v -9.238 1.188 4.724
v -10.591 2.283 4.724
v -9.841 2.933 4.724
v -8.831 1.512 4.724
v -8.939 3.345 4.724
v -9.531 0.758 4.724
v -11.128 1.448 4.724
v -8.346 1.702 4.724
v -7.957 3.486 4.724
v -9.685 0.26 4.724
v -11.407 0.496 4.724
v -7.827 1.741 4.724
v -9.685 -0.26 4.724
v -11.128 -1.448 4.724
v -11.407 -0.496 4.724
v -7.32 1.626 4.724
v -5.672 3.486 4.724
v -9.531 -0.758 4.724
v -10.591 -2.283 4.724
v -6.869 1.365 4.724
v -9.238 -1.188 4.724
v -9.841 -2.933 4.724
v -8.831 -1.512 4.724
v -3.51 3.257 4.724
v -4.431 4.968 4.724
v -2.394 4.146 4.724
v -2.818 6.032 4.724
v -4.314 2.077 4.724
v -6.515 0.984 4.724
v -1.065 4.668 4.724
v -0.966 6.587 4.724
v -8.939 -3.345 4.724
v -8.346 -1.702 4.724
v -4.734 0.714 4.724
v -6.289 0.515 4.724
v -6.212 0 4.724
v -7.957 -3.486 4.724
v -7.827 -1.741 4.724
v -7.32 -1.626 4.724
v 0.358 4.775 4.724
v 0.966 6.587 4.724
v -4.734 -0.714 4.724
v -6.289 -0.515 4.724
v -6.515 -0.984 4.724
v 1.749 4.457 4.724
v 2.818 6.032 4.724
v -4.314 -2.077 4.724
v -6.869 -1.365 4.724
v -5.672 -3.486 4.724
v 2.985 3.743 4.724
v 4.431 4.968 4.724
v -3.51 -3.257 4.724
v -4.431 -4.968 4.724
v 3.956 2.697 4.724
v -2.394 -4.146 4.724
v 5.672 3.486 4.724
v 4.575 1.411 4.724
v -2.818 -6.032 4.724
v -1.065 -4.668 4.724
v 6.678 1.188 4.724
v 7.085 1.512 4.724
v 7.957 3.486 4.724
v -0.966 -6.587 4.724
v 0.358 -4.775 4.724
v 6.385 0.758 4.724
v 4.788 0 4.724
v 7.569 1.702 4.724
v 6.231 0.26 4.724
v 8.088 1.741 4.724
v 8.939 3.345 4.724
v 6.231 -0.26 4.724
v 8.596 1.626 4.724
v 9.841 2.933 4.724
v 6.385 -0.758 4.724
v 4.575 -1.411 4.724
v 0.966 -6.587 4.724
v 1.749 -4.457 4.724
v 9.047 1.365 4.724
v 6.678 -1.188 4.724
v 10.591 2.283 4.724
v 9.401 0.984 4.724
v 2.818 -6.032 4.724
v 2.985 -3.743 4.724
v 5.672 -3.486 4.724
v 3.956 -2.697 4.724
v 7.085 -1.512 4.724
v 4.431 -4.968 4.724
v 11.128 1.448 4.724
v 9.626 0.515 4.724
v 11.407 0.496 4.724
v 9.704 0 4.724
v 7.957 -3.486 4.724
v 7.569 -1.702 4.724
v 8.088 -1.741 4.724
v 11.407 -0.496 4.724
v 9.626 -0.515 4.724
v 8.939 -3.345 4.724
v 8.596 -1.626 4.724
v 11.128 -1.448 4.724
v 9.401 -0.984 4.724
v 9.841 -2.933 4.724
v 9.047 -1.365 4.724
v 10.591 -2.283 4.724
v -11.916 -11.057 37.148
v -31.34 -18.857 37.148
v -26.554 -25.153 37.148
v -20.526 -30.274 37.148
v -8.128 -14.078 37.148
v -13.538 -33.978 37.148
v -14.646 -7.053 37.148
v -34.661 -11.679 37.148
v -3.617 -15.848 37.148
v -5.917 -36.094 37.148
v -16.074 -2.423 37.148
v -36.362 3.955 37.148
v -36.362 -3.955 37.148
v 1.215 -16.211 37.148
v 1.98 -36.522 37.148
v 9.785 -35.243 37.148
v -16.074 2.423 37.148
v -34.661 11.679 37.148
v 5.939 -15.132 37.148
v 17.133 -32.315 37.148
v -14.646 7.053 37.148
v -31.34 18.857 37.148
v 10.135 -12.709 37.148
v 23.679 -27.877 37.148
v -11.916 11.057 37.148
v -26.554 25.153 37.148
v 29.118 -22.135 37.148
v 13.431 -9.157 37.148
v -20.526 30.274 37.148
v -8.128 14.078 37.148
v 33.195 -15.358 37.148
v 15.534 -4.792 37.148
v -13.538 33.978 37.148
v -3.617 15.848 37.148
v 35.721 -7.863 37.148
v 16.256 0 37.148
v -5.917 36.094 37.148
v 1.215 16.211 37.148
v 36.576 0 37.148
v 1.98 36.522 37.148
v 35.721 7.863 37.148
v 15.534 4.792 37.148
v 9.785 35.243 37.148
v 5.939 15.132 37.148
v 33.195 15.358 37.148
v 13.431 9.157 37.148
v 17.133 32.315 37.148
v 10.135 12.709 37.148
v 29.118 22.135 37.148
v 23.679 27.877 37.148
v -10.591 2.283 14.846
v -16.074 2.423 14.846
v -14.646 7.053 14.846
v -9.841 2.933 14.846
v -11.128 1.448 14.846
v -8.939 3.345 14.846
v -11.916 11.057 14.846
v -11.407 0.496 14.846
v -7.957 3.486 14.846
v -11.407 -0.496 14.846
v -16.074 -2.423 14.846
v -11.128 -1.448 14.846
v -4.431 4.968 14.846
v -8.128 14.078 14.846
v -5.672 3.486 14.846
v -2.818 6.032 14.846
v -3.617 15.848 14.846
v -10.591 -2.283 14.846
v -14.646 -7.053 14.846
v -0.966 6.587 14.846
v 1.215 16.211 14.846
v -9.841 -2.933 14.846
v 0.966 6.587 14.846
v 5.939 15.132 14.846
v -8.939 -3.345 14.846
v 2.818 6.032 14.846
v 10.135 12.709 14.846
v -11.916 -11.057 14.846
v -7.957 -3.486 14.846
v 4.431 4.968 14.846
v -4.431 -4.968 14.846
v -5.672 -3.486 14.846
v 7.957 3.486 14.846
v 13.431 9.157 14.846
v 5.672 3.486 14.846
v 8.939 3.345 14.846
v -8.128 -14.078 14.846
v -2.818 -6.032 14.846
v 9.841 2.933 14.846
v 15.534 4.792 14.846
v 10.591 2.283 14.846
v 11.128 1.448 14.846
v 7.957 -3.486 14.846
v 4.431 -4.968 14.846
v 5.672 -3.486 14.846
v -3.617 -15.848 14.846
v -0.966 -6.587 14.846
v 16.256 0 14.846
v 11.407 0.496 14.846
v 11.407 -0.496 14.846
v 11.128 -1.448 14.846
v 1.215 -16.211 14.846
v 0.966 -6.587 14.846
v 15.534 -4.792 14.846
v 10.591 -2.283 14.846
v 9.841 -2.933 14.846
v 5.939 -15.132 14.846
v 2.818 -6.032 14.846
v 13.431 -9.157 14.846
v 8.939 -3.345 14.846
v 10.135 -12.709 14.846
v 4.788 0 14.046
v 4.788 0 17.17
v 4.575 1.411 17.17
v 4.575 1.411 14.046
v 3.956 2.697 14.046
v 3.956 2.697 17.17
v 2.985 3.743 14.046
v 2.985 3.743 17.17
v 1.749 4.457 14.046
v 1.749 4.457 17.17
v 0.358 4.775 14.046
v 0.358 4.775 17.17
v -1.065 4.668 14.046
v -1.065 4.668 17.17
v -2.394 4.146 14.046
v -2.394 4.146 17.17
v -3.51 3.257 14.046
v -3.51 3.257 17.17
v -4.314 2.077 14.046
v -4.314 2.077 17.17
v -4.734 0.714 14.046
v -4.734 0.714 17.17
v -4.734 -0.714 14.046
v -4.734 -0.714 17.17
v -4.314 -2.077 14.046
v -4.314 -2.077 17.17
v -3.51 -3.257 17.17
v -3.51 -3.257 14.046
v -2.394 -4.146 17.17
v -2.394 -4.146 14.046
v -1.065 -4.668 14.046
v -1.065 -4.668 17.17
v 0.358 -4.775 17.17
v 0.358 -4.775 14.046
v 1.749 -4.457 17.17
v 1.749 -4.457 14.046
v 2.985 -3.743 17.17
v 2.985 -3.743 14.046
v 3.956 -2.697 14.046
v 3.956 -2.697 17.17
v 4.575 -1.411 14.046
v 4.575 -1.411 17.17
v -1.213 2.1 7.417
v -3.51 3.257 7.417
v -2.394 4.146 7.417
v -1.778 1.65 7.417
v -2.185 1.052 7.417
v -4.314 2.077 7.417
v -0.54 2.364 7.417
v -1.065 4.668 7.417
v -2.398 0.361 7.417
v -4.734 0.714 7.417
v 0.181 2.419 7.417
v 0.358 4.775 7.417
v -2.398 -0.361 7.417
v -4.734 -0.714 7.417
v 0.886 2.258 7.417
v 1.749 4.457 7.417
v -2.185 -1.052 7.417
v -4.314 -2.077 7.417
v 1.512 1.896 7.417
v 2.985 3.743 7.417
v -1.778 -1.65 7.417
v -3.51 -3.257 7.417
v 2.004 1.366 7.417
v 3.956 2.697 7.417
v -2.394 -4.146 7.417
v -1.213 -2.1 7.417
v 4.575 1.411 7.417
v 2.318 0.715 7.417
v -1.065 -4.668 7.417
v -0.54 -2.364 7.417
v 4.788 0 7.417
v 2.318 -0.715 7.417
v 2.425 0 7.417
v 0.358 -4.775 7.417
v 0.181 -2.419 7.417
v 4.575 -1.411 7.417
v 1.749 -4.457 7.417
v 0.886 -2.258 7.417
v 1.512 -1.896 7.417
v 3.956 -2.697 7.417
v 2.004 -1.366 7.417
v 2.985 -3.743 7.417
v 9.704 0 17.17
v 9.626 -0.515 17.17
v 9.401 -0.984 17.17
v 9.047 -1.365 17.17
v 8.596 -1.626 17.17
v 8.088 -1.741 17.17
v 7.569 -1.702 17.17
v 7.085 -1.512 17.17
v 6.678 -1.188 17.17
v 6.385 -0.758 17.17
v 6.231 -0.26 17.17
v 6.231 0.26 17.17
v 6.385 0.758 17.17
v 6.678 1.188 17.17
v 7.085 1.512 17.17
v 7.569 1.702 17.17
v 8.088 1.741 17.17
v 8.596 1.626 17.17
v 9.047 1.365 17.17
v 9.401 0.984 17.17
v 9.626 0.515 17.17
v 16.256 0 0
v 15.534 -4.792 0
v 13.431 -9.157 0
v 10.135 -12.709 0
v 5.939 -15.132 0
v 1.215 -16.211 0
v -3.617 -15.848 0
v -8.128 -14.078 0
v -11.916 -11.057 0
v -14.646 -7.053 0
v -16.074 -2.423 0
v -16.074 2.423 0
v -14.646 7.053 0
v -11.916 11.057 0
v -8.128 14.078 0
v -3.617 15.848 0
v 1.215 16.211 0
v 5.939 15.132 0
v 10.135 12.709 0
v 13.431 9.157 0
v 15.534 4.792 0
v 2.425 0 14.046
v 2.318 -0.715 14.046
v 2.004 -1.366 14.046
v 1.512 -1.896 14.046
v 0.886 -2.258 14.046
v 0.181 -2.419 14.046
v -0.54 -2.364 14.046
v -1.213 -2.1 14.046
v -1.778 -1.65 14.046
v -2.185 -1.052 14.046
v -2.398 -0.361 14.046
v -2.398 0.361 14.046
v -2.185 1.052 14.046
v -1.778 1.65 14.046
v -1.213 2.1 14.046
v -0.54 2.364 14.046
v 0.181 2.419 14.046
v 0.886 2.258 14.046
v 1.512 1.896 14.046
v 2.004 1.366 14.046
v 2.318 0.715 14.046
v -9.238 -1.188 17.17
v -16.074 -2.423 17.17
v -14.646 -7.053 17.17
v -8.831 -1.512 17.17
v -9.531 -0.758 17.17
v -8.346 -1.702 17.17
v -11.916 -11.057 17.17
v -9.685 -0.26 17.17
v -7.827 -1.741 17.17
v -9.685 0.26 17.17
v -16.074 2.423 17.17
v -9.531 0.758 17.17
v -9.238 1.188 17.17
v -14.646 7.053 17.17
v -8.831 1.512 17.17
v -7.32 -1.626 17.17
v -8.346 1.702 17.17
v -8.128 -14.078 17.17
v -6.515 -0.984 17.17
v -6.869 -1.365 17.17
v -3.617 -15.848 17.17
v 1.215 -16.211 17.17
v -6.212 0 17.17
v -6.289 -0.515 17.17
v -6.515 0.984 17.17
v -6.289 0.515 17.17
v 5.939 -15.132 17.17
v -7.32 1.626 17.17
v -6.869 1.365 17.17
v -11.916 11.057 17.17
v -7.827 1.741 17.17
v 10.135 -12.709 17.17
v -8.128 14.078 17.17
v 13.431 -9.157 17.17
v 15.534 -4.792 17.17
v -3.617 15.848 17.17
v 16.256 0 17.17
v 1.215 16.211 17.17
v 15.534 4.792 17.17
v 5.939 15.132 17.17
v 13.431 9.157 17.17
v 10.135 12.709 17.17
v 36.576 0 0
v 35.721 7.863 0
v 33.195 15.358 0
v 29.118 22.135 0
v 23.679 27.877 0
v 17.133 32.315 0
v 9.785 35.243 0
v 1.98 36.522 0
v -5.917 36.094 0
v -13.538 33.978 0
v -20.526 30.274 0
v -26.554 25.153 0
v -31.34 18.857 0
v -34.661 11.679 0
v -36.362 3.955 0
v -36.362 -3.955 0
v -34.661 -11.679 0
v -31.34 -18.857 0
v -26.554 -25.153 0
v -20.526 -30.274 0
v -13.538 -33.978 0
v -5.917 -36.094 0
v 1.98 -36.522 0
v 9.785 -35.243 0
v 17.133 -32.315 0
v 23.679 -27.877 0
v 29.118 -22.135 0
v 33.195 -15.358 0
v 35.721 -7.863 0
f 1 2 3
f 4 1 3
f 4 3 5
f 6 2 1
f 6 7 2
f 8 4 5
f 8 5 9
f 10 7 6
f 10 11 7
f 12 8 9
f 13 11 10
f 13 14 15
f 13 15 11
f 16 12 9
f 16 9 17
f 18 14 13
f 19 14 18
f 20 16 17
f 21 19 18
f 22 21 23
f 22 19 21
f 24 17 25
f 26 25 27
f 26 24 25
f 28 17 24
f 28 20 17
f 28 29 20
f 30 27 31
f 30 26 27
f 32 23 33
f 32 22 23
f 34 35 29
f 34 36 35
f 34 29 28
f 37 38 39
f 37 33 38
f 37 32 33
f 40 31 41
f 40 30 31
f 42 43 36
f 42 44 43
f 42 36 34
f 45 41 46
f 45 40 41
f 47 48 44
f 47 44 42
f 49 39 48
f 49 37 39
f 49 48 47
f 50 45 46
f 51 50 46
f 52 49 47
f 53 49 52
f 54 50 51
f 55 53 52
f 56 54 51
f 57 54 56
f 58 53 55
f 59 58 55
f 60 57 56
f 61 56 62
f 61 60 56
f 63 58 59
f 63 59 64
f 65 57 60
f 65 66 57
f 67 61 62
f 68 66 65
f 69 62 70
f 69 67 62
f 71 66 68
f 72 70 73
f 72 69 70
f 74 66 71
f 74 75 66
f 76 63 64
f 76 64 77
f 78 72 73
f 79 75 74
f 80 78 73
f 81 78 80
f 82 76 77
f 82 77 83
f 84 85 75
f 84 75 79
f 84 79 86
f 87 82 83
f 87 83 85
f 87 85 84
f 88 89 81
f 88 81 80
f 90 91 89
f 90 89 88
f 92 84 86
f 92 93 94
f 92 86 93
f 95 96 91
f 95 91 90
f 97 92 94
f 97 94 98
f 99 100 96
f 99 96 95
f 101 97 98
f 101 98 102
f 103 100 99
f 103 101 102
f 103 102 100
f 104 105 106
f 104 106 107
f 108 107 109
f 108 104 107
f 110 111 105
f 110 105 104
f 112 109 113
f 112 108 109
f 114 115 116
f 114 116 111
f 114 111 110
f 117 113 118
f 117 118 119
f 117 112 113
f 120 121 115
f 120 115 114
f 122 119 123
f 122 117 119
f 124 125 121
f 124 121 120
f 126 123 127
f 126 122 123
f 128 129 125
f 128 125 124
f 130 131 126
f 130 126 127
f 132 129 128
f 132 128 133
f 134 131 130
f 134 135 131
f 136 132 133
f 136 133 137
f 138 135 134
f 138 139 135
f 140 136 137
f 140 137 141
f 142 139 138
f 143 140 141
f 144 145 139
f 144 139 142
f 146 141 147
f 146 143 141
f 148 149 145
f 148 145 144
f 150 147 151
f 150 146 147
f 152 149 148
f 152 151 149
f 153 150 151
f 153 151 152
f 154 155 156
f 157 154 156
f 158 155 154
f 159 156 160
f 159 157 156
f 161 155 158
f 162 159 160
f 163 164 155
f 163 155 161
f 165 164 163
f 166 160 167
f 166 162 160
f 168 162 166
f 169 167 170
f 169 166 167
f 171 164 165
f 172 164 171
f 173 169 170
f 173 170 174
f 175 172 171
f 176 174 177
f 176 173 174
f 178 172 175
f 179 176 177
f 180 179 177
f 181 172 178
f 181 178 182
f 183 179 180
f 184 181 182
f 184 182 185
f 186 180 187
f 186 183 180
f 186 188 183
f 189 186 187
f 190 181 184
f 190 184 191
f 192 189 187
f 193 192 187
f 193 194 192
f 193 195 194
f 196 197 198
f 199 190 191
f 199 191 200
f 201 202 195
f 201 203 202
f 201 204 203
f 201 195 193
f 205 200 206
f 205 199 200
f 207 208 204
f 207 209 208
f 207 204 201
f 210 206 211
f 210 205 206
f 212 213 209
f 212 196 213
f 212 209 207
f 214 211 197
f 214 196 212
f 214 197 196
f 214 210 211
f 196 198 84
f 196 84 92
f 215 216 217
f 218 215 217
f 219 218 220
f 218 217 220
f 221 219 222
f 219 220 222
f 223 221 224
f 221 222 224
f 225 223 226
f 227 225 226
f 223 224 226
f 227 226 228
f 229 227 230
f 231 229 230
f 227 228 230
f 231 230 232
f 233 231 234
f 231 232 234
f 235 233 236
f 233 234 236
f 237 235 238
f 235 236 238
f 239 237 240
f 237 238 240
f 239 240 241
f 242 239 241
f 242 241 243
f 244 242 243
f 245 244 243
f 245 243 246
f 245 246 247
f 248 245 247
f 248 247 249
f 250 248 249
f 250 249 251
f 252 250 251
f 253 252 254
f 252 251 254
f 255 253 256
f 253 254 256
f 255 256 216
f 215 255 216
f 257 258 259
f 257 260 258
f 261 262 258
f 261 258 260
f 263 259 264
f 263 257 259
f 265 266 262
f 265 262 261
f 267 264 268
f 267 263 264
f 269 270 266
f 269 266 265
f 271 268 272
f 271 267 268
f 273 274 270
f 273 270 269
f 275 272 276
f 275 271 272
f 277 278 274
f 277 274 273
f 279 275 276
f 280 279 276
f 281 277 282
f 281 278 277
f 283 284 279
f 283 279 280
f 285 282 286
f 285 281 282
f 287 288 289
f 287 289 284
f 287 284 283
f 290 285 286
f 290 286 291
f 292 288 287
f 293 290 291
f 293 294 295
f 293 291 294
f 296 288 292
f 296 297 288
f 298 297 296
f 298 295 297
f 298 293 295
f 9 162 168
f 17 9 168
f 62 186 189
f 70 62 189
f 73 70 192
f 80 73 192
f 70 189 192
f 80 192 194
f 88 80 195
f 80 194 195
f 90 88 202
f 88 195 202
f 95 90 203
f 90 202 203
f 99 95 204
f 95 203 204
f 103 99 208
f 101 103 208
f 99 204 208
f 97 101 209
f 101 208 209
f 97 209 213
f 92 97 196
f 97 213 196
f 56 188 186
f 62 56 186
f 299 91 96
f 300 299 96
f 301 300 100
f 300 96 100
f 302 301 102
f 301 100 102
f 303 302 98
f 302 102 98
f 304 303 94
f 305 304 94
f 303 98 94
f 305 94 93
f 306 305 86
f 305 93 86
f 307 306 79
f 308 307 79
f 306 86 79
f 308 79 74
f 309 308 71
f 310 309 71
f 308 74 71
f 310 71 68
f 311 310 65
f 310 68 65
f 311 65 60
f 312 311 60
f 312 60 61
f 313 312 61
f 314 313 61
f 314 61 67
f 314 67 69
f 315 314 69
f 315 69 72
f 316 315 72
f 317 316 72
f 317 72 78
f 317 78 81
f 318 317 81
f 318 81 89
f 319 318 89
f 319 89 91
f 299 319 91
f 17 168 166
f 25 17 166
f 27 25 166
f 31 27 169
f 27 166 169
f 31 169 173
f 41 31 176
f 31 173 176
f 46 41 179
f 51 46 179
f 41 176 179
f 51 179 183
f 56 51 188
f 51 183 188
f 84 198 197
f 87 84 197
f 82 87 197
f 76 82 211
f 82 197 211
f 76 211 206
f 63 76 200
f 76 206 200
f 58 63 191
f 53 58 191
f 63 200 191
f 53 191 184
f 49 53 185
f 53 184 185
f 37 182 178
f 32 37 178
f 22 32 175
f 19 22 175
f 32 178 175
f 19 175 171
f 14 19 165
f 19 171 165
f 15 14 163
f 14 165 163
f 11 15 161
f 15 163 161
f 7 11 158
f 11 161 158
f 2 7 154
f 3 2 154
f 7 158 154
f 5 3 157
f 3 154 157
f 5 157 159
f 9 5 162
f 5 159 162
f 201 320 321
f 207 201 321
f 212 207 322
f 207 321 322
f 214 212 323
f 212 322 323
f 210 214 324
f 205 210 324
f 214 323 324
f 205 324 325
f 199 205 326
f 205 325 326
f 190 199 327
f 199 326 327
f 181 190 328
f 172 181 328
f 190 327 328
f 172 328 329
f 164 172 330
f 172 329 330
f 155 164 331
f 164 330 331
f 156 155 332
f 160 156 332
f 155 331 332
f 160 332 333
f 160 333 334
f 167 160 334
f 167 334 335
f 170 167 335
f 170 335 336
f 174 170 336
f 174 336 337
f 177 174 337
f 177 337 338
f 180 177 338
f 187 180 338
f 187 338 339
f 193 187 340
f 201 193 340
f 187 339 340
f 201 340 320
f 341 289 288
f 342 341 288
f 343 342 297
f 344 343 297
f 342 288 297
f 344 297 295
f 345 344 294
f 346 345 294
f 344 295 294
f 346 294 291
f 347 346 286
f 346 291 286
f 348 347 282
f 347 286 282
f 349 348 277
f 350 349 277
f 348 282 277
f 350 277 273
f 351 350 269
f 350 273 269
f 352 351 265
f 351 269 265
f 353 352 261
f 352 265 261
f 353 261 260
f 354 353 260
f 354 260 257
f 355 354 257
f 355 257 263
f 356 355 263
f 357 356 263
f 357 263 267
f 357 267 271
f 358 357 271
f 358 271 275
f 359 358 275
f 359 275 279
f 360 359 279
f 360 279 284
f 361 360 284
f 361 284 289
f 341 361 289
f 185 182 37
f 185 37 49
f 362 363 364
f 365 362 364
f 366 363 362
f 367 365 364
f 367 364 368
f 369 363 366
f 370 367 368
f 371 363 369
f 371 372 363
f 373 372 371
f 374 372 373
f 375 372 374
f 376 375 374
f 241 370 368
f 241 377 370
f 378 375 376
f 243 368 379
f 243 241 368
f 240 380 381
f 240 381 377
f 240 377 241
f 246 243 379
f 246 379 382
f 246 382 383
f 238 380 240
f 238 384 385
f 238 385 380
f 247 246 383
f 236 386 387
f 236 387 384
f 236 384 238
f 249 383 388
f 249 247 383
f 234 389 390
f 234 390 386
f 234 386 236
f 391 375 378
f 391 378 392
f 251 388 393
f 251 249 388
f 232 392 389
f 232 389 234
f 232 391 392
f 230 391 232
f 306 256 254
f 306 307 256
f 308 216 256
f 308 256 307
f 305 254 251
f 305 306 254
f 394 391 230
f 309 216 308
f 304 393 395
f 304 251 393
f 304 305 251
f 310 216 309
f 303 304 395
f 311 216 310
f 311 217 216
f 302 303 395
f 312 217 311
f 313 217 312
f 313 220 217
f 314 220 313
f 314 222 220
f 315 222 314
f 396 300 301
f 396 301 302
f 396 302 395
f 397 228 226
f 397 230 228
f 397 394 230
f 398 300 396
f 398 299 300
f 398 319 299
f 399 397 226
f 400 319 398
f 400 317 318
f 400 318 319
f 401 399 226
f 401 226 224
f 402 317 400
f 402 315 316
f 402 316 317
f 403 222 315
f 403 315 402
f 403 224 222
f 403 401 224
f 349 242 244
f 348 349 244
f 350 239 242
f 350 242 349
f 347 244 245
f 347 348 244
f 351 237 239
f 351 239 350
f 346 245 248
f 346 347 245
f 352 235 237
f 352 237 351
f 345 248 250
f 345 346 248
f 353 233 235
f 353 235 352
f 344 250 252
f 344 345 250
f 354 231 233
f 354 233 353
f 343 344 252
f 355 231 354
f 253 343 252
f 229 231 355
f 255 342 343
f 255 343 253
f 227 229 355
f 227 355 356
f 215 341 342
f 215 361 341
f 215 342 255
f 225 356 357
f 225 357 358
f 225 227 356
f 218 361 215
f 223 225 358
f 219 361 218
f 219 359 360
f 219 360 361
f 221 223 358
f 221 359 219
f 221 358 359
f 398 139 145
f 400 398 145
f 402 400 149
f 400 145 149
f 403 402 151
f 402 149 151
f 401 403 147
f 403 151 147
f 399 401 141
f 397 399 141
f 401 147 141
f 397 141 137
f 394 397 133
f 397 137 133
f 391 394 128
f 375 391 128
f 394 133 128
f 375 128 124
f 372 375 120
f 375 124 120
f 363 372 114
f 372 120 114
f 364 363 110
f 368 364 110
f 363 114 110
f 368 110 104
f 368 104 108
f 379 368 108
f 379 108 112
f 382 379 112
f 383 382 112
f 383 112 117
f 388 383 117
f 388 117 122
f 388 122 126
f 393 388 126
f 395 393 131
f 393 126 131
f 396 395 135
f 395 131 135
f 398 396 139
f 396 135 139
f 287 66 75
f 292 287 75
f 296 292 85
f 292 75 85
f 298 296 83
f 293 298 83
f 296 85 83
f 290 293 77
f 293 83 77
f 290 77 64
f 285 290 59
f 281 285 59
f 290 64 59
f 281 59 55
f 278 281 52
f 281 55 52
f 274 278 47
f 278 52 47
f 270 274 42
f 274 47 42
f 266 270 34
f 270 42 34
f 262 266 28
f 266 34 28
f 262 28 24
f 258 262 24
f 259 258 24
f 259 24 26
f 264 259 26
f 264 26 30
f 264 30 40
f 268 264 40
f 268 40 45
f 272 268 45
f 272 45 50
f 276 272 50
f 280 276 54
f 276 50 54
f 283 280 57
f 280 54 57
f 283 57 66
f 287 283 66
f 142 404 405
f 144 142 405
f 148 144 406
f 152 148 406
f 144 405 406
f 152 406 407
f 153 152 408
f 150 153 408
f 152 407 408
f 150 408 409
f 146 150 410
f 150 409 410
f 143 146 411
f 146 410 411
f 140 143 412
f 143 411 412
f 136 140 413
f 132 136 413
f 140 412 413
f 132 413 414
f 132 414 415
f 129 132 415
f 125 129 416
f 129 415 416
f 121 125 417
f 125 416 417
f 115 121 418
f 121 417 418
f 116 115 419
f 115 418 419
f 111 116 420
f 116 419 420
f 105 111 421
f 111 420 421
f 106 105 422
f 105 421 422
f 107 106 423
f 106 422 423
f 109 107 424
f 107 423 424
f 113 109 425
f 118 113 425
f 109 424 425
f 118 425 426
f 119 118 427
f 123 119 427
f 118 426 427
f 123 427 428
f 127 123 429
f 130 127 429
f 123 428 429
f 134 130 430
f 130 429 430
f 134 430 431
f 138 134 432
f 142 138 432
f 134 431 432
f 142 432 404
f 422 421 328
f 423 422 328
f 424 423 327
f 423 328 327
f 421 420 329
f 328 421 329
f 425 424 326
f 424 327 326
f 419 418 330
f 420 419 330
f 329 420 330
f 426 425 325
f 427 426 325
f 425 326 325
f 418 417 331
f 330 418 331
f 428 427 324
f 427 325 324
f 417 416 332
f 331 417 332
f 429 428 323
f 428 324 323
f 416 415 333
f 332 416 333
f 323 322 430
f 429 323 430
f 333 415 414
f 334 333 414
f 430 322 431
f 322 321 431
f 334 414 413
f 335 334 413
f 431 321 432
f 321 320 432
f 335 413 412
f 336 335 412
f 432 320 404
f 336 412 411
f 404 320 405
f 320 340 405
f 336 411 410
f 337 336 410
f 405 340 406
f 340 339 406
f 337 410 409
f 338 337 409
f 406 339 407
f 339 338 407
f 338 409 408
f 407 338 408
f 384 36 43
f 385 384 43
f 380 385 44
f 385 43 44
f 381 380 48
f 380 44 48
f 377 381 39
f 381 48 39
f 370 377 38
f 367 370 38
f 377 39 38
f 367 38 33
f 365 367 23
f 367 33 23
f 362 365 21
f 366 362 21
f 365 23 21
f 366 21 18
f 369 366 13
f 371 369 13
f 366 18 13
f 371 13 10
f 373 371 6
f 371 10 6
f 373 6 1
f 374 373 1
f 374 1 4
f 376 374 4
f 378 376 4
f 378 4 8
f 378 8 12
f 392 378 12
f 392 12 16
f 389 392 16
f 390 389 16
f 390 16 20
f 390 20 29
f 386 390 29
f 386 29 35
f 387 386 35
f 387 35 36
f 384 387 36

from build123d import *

# Parameters (mm, degrees)
SKETCH_R        = 36.576
PAD_DEPTH       = 37.1475
SKETCH001_R     = 16.256
POCKET_DEPTH    = 19.9771
SKETCH002_R     = 16.256
POCKET001_DEPTH = 14.8463
PAD001_DEPTH    = 10.1219
SKETCH004_R     = 1.74625
POCKET002_DEPTH = 32.4241
SKETCH005_R     = 4.7879
POCKET003_DEPTH = 2.6924
SKETCH006_R     = 2.425304
POCKET004_DEPTH = 29.7317
SKETCH007_R     = 4.7879
POCKET005_DEPTH = 3.1242


with BuildPart() as part:
    # Sketch → Pad (new body)
    with BuildSketch(Plane.XY):
        Circle(SKETCH_R)
    extrude(amount=PAD_DEPTH)

    # Sketch001 (on Face3 of Pad) → Pocket (cut)
    with BuildSketch(Plane.XY.offset(37.1475)):
        Circle(SKETCH001_R)
    extrude(amount=-POCKET_DEPTH, mode=Mode.SUBTRACT)

    # Sketch002 (on Face2 of Pocket) → Pocket001 (cut)
    with BuildSketch(Plane(origin=(0, 0, 0), x_dir=(1, 0, 0), z_dir=(0, 0, -1))):
        Circle(SKETCH002_R)
    extrude(amount=-POCKET001_DEPTH, mode=Mode.SUBTRACT)

    # Sketch003 (on Face6 of Pocket001) → Pad001 (new body)
    with BuildSketch(Plane(origin=(0, 0, 14.8463), x_dir=(1, 0, 0), z_dir=(0, 0, -1))):
        with BuildLine():
            ThreePointArc((-5.67159, -3.48615), (0, -6.65734), (5.67159, -3.48615))
            Line((5.67159, -3.48615), (7.95655, -3.48615))
            ThreePointArc((7.95655, -3.48615), (11.4427, 0), (7.95655, 3.48615))
            Line((5.67159, 3.48615), (7.95655, 3.48615))
            ThreePointArc((5.67159, 3.48615), (0, 6.65734), (-5.67159, 3.48615))
            Line((-7.95655, 3.48615), (-5.67159, 3.48615))
            ThreePointArc((-7.95655, 3.48615), (-11.4427, 0), (-7.95655, -3.48615))
            Line((-7.95655, -3.48615), (-5.67159, -3.48615))
        make_face()
    extrude(amount=PAD001_DEPTH)

    # Sketch004 (on Face16 of Pad001) → Pocket002 (cut, through all)
    with BuildSketch(Plane(origin=(0, 0, 4.7244), x_dir=(1, 0, 0), z_dir=(0, 0, -1))):
        with Locations((7.95782, 0)):
            Circle(SKETCH004_R)
        with Locations((-7.95782, 0)):
            Circle(SKETCH004_R)
    extrude(amount=-POCKET002_DEPTH, mode=Mode.SUBTRACT)

    # Sketch005 (on Face18 of Pocket002) → Pocket003 (cut)
    with BuildSketch(Plane(origin=(0, 0, 4.7244), x_dir=(1, 0, 0), z_dir=(0, 0, -1))):
        Circle(SKETCH005_R)
    extrude(amount=-POCKET003_DEPTH, mode=Mode.SUBTRACT)

    # Sketch006 (on Face20 of Pocket003) → Pocket004 (cut, through all)
    with BuildSketch(Plane(origin=(0, 0, 7.4168), x_dir=(1, 0, 0), z_dir=(0, 0, -1))):
        Circle(SKETCH006_R)
    extrude(amount=-POCKET004_DEPTH, mode=Mode.SUBTRACT)

    # Sketch007 (on Face7 of Pocket004) → Pocket005 (cut)
    with BuildSketch(Plane.XY.offset(17.1704)):
        Circle(SKETCH007_R)
    extrude(amount=-POCKET005_DEPTH, mode=Mode.SUBTRACT)


solid = part.part
